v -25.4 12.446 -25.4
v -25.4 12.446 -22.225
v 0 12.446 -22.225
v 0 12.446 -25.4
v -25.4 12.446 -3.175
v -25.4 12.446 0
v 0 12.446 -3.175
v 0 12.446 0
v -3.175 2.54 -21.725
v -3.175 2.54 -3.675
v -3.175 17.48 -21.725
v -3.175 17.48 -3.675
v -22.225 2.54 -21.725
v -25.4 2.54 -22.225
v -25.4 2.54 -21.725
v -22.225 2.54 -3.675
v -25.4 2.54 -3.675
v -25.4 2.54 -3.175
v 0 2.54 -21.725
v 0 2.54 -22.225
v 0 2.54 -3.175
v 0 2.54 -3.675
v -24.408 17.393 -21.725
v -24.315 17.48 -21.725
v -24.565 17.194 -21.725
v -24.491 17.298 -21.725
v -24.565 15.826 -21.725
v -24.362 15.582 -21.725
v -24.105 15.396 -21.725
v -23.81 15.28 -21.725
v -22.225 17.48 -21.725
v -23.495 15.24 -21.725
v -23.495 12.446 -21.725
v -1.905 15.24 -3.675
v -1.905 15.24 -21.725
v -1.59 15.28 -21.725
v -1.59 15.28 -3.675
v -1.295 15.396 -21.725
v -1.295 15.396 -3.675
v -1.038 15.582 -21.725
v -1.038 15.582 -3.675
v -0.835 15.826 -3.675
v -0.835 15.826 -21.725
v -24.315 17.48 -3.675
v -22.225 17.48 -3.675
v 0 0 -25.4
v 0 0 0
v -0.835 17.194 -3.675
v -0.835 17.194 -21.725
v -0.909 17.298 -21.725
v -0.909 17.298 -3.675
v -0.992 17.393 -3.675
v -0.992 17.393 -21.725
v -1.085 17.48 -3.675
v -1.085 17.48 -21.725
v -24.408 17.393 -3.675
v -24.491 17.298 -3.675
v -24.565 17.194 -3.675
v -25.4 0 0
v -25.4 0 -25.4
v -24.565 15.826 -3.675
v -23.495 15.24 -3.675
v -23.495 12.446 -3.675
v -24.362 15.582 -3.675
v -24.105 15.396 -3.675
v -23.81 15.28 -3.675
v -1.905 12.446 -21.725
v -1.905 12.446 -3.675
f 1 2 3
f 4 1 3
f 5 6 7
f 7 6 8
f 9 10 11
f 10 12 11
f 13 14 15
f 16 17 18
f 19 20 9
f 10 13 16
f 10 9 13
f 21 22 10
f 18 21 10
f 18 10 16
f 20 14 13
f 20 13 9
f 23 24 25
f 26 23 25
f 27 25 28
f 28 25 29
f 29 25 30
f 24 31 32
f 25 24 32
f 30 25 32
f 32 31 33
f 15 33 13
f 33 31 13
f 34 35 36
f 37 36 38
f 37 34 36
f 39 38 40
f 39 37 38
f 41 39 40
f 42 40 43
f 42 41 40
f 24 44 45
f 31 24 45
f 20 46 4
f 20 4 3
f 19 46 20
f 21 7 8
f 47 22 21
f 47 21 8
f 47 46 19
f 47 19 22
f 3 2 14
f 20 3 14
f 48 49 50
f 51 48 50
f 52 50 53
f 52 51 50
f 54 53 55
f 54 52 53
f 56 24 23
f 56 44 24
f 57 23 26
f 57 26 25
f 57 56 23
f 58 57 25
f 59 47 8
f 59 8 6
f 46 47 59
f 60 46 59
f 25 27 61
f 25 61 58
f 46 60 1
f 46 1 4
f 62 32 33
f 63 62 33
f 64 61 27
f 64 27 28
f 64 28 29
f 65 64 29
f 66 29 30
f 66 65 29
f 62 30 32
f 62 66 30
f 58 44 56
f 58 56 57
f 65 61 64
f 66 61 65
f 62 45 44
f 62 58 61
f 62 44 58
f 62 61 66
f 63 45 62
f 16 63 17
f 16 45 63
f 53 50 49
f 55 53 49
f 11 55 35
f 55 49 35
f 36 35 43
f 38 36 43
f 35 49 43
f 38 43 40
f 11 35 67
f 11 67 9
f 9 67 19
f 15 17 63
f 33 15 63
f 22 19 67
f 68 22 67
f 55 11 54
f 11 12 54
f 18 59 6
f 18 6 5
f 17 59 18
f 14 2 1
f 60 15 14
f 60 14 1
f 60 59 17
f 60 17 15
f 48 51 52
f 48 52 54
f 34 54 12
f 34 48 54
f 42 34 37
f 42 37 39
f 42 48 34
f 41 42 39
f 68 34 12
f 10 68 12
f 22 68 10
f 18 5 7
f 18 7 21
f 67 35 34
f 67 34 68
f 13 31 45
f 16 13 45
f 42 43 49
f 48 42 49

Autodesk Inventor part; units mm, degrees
ref_plane "YZ Plane" through (0, 0, 0) normal (1, 0, 0) x (0, 1, 0)
ref_plane "XZ Plane" through (0, 0, 0) normal (0, 1, 0) x (-1, 0, 0)
ref_plane "XY Plane" through (0, 0, 0) normal (0, 0, 1) x (1, 0, 0)
sketch "Sketch1" plane through (0, 0, 0) normal (0, 1, 0) x (-1, 0, 0)
  point P0 (0, 0)
sketch "Sketch2" plane through (0, 0, 0) normal (0, 1, 0) x (-1, 0, 0)
  line L0 (0, 0) -> (25.4, 0)
  line L1 (25.4, 0) -> (25.4, -25.4)
  line L2 (25.4, -25.4) -> (0, -25.4)
  line L3 (0, -25.4) -> (0, 0)
  dimension "d0" = 25.4
  dimension "d1" = 25.4
extrude "Extrusion1" add sketch "Sketch2" along normal blind 17.78
sketch "Sketch3" plane through (0, 17.78, 0) normal (0, 1, 0) x (1, 0, 0)
  line L0 (-22.225, 3.175) -> (-3.175, 3.175)
  line L1 (-3.175, 3.175) -> (-3.175, 22.225)
  line L2 (-3.175, 22.225) -> (-22.225, 22.225)
  line L3 (-22.225, 22.225) -> (-22.225, 3.175)
  line L4 (-25.4, 25.4) -> (-25.4, 0) projected
  line L5 (0, 25.4) -> (-25.4, 25.4) projected
  line L6 (-25.4, 0) -> (0, 0) projected
  line L7 (0, 0) -> (0, 25.4) projected
  dimension "d4" = 3.175
  dimension "d5" = 3.175
  dimension "d6" = 3.175
  dimension "d7" = 3.175
extrude "Extrusion2" cut sketch "Sketch3" against normal blind 15.24 contours L3 L2 L1 L0
sketch "Sketch4" plane through (-25.4, 0, 0) normal (0, 0, 1) x (1, 0, 0)
  circle A0 centre (1.905, 16.51) radius 1.27
  circle A1 centre (23.495, 16.51) radius 1.27
  line L0 (0, 17.78) -> (25.4, 17.78) projected
  line L1 (3.175, 17.78) -> (3.175, 2.54) projected
  line L2 (22.225, 17.78) -> (22.225, 2.54) projected
  line L3 (3.175, 17.78) -> (1.905, 17.78)
  line L4 (1.905, 17.78) -> (1.905, 12.446)
  line L5 (1.905, 12.446) -> (3.175, 12.446)
  line L6 (3.175, 12.446) -> (3.175, 17.78)
  line L7 (22.225, 17.78) -> (23.495, 17.78)
  line L8 (23.495, 17.78) -> (23.495, 12.446)
  line L9 (23.495, 12.446) -> (22.225, 12.446)
  line L10 (22.225, 12.446) -> (22.225, 17.78)
  line L11 (3.175, 17.78) -> (0, 17.78)
  line L12 (0, 17.78) -> (0, 12.446)
  line L13 (0, 12.446) -> (3.175, 12.446)
  line L14 (3.175, 12.446) -> (3.175, 17.78)
  line L15 (22.225, 17.78) -> (25.4, 17.78)
  line L16 (25.4, 17.78) -> (25.4, 12.446)
  line L17 (25.4, 12.446) -> (22.225, 12.446)
  line L18 (22.225, 12.446) -> (22.225, 17.78)
  point P0 (25.4, 0)
  point P1 (1.905, 12.446)
  point P2 (1.905, 15.24)
  point P3 (1.905, 17.78)
  point P4 (23.495, 15.24)
  dimension "d10" = 2.54
  dimension "d11" = 2.54
  dimension "d12" = 1.27
  dimension "d13" = 1.27
  dimension "d14" = 1.27
  dimension "d15" = 1.27
  dimension "d16" = 1.27
  dimension "d17" = 5.334
  dimension "d18" = 1.27
  dimension "d19" = 5.334
extrude "Extrusion3" cut sketch "Sketch4" against normal blind 25.4 contours A0 L4 L13 L12 L0 | L0 L16 L17 L8 A1
sketch "Sketch5" plane through (0, 0, 0) normal (1, 0, 0) x (0, 0, -1)
  line L0 (3.175, 17.78) -> (22.225, 17.78) projected
  line L1 (0, 12.446) -> (25.4, 12.446) projected
  line L2 (0, 12.446) -> (25.4, 12.446) projected
  line L3 (0, 17.78) -> (3.675, 17.78)
  line L4 (3.675, 17.78) -> (3.675, 12.446)
  line L5 (3.675, 12.446) -> (0, 12.446)
  line L6 (0, 12.446) -> (0, 17.78)
  line L7 (25.4, 15.24) -> (25.4, 17.78) projected
  line L8 (25.4, 17.78) -> (21.725, 17.78)
  line L9 (21.725, 17.78) -> (21.725, 12.446)
  line L10 (21.725, 12.446) -> (25.4, 12.446)
  line L11 (25.4, 12.446) -> (25.4, 17.78)
  line L12 (22.225, 2.54) -> (3.175, 2.54) projected
  line L13 (3.675, 12.446) -> (3.175, 12.446)
  line L14 (3.175, 12.446) -> (3.175, 2.54)
  line L15 (3.175, 2.54) -> (3.675, 2.54)
  line L16 (3.675, 2.54) -> (3.675, 12.446)
  line L17 (22.225, 17.78) -> (22.225, 2.54) projected
  line L18 (21.725, 12.446) -> (22.225, 12.446)
  line L19 (22.225, 12.446) -> (22.225, 2.54)
  line L20 (22.225, 2.54) -> (21.725, 2.54)
  line L21 (21.725, 2.54) -> (21.725, 12.446)
  point P0 (0, 0)
  point P1 (25.4, 12.446)
  point P2 (21.725, 12.446)
  point P3 (0, 12.446)
  point P4 (22.225, 12.446)
  dimension "d25" = 3.675
  dimension "d26" = 3.675
extrude "Extrusion4" cut sketch "Sketch5" against normal blind 25.4 contours L0 L4 L1 L6 L3 | L0 L17 L1 L9 | L16 L12 L14 L1 | L8 L7 L11 L1 L17 | L1 L17 L12 L21
sketch "Sketch7" plane through (0, 2.54, -3.675) normal (0, 0, 1) x (1, 0, 0)
  line L0 (-3.175, 15.24) -> (-3.175, 0) projected
  line L1 (-1.905, 12.7) -> (-1.905, 9.906) projected
  line L2 (0, 9.906) -> (0, 0) projected
  line L3 (-1.905, 9.906) -> (0, 9.906) projected
  line L4 (0, 0) -> (-1.905, 9.906)
  line L5 (-1.905, 9.906) -> (0, 9.906)
  line L6 (0, 0) -> (-25.4, 0) projected
  line L7 (0, 0) -> (0, 9.906)
  line L8 (0, 9.906) -> (-25.4, 9.906) projected
  line L9 (-25.4, 9.906) -> (-25.4, 0)
  line L10 (-23.495, 9.906) -> (-23.495, 12.7) projected
  line L11 (-25.4, 0) -> (-23.495, 9.906)
  line L12 (-23.495, 9.906) -> (-25.4, 9.906)
  point P0 (0, -2.54)
extrude "Extrusion6" cut sketch "Sketch7" against normal blind 18.5 contours L3 L2 L4 | L11 L9 L8
sketch "Sketch8" plane through (-23.495, 17.78, -3.675) normal (0, 0, 1) x (1, 0, 0)
  arc A0 (0, 0) -> (0, -2.54) centre (0, -1.27) ccw projected
  line L0 (-1.07, -2.27) -> (-1.07, 0)
  line L1 (-1.07, 0) -> (-1.27, 0)
  line L2 (-1.27, 0) -> (-1.27, -1.27)
  line L3 (-1.07, 0) -> (-1.07, -2.27)
  line L4 (-1.07, -2.27) -> (-1.27, -2.27)
  line L5 (-1.27, -2.27) -> (-1.27, -1.27)
  arc A1 (21.59, -2.54) -> (21.59, 0) centre (21.59, -1.27) ccw projected
  line L6 (22.66, -1.3632) -> (22.66, 0)
  line L7 (22.66, 0) -> (22.86, 0)
  line L8 (22.86, 0) -> (22.86, -1.27)
  line L9 (22.86, -1.3632) -> (22.86, -3.2076)
  line L10 (22.86, -3.2076) -> (22.66, -3.2076)
  line L11 (22.66, -3.2076) -> (22.66, -1.3632)
  line L12 (22.86, 0) -> (-1.27, 0)
  line L13 (-1.27, 0) -> (-1.27, -0.3)
  line L14 (-1.27, -0.3) -> (22.86, -0.3)
  line L15 (22.86, -0.3) -> (22.86, 0)
  line L16 (0, 0) -> (1.27, 0) projected
  point P0 (23.495, -17.78)
  point P1 (10.795, -0.3)
  point P2 (22.66, -1.9541)
  point P3 (22.66, -0.5859)
  point P4 (-1.07, 0)
  point P5 (-1.07, -0.3)
  point P6 (22.86, -0.3)
  point P7 (22.66, 0)
  dimension "d34" = 0.2
  dimension "d35" = 1
  dimension "d36" = 0.2
  dimension "d37" = 0.3
  dimension "d38" = 0
extrude "Extrusion7" cut sketch "Sketch8" against normal blind 18.5 contours L12 A1 L14 A0 | A0 L14 L0 L12 | L0 L14 L2 L1 | L0 A0 | A0 L2 L14 L0 | A1 L12 L6 L14 | A0 L0 L4 L5 | A1 L11 L6 | L6 L7 L8 L14
properties part number "boxtest2"
